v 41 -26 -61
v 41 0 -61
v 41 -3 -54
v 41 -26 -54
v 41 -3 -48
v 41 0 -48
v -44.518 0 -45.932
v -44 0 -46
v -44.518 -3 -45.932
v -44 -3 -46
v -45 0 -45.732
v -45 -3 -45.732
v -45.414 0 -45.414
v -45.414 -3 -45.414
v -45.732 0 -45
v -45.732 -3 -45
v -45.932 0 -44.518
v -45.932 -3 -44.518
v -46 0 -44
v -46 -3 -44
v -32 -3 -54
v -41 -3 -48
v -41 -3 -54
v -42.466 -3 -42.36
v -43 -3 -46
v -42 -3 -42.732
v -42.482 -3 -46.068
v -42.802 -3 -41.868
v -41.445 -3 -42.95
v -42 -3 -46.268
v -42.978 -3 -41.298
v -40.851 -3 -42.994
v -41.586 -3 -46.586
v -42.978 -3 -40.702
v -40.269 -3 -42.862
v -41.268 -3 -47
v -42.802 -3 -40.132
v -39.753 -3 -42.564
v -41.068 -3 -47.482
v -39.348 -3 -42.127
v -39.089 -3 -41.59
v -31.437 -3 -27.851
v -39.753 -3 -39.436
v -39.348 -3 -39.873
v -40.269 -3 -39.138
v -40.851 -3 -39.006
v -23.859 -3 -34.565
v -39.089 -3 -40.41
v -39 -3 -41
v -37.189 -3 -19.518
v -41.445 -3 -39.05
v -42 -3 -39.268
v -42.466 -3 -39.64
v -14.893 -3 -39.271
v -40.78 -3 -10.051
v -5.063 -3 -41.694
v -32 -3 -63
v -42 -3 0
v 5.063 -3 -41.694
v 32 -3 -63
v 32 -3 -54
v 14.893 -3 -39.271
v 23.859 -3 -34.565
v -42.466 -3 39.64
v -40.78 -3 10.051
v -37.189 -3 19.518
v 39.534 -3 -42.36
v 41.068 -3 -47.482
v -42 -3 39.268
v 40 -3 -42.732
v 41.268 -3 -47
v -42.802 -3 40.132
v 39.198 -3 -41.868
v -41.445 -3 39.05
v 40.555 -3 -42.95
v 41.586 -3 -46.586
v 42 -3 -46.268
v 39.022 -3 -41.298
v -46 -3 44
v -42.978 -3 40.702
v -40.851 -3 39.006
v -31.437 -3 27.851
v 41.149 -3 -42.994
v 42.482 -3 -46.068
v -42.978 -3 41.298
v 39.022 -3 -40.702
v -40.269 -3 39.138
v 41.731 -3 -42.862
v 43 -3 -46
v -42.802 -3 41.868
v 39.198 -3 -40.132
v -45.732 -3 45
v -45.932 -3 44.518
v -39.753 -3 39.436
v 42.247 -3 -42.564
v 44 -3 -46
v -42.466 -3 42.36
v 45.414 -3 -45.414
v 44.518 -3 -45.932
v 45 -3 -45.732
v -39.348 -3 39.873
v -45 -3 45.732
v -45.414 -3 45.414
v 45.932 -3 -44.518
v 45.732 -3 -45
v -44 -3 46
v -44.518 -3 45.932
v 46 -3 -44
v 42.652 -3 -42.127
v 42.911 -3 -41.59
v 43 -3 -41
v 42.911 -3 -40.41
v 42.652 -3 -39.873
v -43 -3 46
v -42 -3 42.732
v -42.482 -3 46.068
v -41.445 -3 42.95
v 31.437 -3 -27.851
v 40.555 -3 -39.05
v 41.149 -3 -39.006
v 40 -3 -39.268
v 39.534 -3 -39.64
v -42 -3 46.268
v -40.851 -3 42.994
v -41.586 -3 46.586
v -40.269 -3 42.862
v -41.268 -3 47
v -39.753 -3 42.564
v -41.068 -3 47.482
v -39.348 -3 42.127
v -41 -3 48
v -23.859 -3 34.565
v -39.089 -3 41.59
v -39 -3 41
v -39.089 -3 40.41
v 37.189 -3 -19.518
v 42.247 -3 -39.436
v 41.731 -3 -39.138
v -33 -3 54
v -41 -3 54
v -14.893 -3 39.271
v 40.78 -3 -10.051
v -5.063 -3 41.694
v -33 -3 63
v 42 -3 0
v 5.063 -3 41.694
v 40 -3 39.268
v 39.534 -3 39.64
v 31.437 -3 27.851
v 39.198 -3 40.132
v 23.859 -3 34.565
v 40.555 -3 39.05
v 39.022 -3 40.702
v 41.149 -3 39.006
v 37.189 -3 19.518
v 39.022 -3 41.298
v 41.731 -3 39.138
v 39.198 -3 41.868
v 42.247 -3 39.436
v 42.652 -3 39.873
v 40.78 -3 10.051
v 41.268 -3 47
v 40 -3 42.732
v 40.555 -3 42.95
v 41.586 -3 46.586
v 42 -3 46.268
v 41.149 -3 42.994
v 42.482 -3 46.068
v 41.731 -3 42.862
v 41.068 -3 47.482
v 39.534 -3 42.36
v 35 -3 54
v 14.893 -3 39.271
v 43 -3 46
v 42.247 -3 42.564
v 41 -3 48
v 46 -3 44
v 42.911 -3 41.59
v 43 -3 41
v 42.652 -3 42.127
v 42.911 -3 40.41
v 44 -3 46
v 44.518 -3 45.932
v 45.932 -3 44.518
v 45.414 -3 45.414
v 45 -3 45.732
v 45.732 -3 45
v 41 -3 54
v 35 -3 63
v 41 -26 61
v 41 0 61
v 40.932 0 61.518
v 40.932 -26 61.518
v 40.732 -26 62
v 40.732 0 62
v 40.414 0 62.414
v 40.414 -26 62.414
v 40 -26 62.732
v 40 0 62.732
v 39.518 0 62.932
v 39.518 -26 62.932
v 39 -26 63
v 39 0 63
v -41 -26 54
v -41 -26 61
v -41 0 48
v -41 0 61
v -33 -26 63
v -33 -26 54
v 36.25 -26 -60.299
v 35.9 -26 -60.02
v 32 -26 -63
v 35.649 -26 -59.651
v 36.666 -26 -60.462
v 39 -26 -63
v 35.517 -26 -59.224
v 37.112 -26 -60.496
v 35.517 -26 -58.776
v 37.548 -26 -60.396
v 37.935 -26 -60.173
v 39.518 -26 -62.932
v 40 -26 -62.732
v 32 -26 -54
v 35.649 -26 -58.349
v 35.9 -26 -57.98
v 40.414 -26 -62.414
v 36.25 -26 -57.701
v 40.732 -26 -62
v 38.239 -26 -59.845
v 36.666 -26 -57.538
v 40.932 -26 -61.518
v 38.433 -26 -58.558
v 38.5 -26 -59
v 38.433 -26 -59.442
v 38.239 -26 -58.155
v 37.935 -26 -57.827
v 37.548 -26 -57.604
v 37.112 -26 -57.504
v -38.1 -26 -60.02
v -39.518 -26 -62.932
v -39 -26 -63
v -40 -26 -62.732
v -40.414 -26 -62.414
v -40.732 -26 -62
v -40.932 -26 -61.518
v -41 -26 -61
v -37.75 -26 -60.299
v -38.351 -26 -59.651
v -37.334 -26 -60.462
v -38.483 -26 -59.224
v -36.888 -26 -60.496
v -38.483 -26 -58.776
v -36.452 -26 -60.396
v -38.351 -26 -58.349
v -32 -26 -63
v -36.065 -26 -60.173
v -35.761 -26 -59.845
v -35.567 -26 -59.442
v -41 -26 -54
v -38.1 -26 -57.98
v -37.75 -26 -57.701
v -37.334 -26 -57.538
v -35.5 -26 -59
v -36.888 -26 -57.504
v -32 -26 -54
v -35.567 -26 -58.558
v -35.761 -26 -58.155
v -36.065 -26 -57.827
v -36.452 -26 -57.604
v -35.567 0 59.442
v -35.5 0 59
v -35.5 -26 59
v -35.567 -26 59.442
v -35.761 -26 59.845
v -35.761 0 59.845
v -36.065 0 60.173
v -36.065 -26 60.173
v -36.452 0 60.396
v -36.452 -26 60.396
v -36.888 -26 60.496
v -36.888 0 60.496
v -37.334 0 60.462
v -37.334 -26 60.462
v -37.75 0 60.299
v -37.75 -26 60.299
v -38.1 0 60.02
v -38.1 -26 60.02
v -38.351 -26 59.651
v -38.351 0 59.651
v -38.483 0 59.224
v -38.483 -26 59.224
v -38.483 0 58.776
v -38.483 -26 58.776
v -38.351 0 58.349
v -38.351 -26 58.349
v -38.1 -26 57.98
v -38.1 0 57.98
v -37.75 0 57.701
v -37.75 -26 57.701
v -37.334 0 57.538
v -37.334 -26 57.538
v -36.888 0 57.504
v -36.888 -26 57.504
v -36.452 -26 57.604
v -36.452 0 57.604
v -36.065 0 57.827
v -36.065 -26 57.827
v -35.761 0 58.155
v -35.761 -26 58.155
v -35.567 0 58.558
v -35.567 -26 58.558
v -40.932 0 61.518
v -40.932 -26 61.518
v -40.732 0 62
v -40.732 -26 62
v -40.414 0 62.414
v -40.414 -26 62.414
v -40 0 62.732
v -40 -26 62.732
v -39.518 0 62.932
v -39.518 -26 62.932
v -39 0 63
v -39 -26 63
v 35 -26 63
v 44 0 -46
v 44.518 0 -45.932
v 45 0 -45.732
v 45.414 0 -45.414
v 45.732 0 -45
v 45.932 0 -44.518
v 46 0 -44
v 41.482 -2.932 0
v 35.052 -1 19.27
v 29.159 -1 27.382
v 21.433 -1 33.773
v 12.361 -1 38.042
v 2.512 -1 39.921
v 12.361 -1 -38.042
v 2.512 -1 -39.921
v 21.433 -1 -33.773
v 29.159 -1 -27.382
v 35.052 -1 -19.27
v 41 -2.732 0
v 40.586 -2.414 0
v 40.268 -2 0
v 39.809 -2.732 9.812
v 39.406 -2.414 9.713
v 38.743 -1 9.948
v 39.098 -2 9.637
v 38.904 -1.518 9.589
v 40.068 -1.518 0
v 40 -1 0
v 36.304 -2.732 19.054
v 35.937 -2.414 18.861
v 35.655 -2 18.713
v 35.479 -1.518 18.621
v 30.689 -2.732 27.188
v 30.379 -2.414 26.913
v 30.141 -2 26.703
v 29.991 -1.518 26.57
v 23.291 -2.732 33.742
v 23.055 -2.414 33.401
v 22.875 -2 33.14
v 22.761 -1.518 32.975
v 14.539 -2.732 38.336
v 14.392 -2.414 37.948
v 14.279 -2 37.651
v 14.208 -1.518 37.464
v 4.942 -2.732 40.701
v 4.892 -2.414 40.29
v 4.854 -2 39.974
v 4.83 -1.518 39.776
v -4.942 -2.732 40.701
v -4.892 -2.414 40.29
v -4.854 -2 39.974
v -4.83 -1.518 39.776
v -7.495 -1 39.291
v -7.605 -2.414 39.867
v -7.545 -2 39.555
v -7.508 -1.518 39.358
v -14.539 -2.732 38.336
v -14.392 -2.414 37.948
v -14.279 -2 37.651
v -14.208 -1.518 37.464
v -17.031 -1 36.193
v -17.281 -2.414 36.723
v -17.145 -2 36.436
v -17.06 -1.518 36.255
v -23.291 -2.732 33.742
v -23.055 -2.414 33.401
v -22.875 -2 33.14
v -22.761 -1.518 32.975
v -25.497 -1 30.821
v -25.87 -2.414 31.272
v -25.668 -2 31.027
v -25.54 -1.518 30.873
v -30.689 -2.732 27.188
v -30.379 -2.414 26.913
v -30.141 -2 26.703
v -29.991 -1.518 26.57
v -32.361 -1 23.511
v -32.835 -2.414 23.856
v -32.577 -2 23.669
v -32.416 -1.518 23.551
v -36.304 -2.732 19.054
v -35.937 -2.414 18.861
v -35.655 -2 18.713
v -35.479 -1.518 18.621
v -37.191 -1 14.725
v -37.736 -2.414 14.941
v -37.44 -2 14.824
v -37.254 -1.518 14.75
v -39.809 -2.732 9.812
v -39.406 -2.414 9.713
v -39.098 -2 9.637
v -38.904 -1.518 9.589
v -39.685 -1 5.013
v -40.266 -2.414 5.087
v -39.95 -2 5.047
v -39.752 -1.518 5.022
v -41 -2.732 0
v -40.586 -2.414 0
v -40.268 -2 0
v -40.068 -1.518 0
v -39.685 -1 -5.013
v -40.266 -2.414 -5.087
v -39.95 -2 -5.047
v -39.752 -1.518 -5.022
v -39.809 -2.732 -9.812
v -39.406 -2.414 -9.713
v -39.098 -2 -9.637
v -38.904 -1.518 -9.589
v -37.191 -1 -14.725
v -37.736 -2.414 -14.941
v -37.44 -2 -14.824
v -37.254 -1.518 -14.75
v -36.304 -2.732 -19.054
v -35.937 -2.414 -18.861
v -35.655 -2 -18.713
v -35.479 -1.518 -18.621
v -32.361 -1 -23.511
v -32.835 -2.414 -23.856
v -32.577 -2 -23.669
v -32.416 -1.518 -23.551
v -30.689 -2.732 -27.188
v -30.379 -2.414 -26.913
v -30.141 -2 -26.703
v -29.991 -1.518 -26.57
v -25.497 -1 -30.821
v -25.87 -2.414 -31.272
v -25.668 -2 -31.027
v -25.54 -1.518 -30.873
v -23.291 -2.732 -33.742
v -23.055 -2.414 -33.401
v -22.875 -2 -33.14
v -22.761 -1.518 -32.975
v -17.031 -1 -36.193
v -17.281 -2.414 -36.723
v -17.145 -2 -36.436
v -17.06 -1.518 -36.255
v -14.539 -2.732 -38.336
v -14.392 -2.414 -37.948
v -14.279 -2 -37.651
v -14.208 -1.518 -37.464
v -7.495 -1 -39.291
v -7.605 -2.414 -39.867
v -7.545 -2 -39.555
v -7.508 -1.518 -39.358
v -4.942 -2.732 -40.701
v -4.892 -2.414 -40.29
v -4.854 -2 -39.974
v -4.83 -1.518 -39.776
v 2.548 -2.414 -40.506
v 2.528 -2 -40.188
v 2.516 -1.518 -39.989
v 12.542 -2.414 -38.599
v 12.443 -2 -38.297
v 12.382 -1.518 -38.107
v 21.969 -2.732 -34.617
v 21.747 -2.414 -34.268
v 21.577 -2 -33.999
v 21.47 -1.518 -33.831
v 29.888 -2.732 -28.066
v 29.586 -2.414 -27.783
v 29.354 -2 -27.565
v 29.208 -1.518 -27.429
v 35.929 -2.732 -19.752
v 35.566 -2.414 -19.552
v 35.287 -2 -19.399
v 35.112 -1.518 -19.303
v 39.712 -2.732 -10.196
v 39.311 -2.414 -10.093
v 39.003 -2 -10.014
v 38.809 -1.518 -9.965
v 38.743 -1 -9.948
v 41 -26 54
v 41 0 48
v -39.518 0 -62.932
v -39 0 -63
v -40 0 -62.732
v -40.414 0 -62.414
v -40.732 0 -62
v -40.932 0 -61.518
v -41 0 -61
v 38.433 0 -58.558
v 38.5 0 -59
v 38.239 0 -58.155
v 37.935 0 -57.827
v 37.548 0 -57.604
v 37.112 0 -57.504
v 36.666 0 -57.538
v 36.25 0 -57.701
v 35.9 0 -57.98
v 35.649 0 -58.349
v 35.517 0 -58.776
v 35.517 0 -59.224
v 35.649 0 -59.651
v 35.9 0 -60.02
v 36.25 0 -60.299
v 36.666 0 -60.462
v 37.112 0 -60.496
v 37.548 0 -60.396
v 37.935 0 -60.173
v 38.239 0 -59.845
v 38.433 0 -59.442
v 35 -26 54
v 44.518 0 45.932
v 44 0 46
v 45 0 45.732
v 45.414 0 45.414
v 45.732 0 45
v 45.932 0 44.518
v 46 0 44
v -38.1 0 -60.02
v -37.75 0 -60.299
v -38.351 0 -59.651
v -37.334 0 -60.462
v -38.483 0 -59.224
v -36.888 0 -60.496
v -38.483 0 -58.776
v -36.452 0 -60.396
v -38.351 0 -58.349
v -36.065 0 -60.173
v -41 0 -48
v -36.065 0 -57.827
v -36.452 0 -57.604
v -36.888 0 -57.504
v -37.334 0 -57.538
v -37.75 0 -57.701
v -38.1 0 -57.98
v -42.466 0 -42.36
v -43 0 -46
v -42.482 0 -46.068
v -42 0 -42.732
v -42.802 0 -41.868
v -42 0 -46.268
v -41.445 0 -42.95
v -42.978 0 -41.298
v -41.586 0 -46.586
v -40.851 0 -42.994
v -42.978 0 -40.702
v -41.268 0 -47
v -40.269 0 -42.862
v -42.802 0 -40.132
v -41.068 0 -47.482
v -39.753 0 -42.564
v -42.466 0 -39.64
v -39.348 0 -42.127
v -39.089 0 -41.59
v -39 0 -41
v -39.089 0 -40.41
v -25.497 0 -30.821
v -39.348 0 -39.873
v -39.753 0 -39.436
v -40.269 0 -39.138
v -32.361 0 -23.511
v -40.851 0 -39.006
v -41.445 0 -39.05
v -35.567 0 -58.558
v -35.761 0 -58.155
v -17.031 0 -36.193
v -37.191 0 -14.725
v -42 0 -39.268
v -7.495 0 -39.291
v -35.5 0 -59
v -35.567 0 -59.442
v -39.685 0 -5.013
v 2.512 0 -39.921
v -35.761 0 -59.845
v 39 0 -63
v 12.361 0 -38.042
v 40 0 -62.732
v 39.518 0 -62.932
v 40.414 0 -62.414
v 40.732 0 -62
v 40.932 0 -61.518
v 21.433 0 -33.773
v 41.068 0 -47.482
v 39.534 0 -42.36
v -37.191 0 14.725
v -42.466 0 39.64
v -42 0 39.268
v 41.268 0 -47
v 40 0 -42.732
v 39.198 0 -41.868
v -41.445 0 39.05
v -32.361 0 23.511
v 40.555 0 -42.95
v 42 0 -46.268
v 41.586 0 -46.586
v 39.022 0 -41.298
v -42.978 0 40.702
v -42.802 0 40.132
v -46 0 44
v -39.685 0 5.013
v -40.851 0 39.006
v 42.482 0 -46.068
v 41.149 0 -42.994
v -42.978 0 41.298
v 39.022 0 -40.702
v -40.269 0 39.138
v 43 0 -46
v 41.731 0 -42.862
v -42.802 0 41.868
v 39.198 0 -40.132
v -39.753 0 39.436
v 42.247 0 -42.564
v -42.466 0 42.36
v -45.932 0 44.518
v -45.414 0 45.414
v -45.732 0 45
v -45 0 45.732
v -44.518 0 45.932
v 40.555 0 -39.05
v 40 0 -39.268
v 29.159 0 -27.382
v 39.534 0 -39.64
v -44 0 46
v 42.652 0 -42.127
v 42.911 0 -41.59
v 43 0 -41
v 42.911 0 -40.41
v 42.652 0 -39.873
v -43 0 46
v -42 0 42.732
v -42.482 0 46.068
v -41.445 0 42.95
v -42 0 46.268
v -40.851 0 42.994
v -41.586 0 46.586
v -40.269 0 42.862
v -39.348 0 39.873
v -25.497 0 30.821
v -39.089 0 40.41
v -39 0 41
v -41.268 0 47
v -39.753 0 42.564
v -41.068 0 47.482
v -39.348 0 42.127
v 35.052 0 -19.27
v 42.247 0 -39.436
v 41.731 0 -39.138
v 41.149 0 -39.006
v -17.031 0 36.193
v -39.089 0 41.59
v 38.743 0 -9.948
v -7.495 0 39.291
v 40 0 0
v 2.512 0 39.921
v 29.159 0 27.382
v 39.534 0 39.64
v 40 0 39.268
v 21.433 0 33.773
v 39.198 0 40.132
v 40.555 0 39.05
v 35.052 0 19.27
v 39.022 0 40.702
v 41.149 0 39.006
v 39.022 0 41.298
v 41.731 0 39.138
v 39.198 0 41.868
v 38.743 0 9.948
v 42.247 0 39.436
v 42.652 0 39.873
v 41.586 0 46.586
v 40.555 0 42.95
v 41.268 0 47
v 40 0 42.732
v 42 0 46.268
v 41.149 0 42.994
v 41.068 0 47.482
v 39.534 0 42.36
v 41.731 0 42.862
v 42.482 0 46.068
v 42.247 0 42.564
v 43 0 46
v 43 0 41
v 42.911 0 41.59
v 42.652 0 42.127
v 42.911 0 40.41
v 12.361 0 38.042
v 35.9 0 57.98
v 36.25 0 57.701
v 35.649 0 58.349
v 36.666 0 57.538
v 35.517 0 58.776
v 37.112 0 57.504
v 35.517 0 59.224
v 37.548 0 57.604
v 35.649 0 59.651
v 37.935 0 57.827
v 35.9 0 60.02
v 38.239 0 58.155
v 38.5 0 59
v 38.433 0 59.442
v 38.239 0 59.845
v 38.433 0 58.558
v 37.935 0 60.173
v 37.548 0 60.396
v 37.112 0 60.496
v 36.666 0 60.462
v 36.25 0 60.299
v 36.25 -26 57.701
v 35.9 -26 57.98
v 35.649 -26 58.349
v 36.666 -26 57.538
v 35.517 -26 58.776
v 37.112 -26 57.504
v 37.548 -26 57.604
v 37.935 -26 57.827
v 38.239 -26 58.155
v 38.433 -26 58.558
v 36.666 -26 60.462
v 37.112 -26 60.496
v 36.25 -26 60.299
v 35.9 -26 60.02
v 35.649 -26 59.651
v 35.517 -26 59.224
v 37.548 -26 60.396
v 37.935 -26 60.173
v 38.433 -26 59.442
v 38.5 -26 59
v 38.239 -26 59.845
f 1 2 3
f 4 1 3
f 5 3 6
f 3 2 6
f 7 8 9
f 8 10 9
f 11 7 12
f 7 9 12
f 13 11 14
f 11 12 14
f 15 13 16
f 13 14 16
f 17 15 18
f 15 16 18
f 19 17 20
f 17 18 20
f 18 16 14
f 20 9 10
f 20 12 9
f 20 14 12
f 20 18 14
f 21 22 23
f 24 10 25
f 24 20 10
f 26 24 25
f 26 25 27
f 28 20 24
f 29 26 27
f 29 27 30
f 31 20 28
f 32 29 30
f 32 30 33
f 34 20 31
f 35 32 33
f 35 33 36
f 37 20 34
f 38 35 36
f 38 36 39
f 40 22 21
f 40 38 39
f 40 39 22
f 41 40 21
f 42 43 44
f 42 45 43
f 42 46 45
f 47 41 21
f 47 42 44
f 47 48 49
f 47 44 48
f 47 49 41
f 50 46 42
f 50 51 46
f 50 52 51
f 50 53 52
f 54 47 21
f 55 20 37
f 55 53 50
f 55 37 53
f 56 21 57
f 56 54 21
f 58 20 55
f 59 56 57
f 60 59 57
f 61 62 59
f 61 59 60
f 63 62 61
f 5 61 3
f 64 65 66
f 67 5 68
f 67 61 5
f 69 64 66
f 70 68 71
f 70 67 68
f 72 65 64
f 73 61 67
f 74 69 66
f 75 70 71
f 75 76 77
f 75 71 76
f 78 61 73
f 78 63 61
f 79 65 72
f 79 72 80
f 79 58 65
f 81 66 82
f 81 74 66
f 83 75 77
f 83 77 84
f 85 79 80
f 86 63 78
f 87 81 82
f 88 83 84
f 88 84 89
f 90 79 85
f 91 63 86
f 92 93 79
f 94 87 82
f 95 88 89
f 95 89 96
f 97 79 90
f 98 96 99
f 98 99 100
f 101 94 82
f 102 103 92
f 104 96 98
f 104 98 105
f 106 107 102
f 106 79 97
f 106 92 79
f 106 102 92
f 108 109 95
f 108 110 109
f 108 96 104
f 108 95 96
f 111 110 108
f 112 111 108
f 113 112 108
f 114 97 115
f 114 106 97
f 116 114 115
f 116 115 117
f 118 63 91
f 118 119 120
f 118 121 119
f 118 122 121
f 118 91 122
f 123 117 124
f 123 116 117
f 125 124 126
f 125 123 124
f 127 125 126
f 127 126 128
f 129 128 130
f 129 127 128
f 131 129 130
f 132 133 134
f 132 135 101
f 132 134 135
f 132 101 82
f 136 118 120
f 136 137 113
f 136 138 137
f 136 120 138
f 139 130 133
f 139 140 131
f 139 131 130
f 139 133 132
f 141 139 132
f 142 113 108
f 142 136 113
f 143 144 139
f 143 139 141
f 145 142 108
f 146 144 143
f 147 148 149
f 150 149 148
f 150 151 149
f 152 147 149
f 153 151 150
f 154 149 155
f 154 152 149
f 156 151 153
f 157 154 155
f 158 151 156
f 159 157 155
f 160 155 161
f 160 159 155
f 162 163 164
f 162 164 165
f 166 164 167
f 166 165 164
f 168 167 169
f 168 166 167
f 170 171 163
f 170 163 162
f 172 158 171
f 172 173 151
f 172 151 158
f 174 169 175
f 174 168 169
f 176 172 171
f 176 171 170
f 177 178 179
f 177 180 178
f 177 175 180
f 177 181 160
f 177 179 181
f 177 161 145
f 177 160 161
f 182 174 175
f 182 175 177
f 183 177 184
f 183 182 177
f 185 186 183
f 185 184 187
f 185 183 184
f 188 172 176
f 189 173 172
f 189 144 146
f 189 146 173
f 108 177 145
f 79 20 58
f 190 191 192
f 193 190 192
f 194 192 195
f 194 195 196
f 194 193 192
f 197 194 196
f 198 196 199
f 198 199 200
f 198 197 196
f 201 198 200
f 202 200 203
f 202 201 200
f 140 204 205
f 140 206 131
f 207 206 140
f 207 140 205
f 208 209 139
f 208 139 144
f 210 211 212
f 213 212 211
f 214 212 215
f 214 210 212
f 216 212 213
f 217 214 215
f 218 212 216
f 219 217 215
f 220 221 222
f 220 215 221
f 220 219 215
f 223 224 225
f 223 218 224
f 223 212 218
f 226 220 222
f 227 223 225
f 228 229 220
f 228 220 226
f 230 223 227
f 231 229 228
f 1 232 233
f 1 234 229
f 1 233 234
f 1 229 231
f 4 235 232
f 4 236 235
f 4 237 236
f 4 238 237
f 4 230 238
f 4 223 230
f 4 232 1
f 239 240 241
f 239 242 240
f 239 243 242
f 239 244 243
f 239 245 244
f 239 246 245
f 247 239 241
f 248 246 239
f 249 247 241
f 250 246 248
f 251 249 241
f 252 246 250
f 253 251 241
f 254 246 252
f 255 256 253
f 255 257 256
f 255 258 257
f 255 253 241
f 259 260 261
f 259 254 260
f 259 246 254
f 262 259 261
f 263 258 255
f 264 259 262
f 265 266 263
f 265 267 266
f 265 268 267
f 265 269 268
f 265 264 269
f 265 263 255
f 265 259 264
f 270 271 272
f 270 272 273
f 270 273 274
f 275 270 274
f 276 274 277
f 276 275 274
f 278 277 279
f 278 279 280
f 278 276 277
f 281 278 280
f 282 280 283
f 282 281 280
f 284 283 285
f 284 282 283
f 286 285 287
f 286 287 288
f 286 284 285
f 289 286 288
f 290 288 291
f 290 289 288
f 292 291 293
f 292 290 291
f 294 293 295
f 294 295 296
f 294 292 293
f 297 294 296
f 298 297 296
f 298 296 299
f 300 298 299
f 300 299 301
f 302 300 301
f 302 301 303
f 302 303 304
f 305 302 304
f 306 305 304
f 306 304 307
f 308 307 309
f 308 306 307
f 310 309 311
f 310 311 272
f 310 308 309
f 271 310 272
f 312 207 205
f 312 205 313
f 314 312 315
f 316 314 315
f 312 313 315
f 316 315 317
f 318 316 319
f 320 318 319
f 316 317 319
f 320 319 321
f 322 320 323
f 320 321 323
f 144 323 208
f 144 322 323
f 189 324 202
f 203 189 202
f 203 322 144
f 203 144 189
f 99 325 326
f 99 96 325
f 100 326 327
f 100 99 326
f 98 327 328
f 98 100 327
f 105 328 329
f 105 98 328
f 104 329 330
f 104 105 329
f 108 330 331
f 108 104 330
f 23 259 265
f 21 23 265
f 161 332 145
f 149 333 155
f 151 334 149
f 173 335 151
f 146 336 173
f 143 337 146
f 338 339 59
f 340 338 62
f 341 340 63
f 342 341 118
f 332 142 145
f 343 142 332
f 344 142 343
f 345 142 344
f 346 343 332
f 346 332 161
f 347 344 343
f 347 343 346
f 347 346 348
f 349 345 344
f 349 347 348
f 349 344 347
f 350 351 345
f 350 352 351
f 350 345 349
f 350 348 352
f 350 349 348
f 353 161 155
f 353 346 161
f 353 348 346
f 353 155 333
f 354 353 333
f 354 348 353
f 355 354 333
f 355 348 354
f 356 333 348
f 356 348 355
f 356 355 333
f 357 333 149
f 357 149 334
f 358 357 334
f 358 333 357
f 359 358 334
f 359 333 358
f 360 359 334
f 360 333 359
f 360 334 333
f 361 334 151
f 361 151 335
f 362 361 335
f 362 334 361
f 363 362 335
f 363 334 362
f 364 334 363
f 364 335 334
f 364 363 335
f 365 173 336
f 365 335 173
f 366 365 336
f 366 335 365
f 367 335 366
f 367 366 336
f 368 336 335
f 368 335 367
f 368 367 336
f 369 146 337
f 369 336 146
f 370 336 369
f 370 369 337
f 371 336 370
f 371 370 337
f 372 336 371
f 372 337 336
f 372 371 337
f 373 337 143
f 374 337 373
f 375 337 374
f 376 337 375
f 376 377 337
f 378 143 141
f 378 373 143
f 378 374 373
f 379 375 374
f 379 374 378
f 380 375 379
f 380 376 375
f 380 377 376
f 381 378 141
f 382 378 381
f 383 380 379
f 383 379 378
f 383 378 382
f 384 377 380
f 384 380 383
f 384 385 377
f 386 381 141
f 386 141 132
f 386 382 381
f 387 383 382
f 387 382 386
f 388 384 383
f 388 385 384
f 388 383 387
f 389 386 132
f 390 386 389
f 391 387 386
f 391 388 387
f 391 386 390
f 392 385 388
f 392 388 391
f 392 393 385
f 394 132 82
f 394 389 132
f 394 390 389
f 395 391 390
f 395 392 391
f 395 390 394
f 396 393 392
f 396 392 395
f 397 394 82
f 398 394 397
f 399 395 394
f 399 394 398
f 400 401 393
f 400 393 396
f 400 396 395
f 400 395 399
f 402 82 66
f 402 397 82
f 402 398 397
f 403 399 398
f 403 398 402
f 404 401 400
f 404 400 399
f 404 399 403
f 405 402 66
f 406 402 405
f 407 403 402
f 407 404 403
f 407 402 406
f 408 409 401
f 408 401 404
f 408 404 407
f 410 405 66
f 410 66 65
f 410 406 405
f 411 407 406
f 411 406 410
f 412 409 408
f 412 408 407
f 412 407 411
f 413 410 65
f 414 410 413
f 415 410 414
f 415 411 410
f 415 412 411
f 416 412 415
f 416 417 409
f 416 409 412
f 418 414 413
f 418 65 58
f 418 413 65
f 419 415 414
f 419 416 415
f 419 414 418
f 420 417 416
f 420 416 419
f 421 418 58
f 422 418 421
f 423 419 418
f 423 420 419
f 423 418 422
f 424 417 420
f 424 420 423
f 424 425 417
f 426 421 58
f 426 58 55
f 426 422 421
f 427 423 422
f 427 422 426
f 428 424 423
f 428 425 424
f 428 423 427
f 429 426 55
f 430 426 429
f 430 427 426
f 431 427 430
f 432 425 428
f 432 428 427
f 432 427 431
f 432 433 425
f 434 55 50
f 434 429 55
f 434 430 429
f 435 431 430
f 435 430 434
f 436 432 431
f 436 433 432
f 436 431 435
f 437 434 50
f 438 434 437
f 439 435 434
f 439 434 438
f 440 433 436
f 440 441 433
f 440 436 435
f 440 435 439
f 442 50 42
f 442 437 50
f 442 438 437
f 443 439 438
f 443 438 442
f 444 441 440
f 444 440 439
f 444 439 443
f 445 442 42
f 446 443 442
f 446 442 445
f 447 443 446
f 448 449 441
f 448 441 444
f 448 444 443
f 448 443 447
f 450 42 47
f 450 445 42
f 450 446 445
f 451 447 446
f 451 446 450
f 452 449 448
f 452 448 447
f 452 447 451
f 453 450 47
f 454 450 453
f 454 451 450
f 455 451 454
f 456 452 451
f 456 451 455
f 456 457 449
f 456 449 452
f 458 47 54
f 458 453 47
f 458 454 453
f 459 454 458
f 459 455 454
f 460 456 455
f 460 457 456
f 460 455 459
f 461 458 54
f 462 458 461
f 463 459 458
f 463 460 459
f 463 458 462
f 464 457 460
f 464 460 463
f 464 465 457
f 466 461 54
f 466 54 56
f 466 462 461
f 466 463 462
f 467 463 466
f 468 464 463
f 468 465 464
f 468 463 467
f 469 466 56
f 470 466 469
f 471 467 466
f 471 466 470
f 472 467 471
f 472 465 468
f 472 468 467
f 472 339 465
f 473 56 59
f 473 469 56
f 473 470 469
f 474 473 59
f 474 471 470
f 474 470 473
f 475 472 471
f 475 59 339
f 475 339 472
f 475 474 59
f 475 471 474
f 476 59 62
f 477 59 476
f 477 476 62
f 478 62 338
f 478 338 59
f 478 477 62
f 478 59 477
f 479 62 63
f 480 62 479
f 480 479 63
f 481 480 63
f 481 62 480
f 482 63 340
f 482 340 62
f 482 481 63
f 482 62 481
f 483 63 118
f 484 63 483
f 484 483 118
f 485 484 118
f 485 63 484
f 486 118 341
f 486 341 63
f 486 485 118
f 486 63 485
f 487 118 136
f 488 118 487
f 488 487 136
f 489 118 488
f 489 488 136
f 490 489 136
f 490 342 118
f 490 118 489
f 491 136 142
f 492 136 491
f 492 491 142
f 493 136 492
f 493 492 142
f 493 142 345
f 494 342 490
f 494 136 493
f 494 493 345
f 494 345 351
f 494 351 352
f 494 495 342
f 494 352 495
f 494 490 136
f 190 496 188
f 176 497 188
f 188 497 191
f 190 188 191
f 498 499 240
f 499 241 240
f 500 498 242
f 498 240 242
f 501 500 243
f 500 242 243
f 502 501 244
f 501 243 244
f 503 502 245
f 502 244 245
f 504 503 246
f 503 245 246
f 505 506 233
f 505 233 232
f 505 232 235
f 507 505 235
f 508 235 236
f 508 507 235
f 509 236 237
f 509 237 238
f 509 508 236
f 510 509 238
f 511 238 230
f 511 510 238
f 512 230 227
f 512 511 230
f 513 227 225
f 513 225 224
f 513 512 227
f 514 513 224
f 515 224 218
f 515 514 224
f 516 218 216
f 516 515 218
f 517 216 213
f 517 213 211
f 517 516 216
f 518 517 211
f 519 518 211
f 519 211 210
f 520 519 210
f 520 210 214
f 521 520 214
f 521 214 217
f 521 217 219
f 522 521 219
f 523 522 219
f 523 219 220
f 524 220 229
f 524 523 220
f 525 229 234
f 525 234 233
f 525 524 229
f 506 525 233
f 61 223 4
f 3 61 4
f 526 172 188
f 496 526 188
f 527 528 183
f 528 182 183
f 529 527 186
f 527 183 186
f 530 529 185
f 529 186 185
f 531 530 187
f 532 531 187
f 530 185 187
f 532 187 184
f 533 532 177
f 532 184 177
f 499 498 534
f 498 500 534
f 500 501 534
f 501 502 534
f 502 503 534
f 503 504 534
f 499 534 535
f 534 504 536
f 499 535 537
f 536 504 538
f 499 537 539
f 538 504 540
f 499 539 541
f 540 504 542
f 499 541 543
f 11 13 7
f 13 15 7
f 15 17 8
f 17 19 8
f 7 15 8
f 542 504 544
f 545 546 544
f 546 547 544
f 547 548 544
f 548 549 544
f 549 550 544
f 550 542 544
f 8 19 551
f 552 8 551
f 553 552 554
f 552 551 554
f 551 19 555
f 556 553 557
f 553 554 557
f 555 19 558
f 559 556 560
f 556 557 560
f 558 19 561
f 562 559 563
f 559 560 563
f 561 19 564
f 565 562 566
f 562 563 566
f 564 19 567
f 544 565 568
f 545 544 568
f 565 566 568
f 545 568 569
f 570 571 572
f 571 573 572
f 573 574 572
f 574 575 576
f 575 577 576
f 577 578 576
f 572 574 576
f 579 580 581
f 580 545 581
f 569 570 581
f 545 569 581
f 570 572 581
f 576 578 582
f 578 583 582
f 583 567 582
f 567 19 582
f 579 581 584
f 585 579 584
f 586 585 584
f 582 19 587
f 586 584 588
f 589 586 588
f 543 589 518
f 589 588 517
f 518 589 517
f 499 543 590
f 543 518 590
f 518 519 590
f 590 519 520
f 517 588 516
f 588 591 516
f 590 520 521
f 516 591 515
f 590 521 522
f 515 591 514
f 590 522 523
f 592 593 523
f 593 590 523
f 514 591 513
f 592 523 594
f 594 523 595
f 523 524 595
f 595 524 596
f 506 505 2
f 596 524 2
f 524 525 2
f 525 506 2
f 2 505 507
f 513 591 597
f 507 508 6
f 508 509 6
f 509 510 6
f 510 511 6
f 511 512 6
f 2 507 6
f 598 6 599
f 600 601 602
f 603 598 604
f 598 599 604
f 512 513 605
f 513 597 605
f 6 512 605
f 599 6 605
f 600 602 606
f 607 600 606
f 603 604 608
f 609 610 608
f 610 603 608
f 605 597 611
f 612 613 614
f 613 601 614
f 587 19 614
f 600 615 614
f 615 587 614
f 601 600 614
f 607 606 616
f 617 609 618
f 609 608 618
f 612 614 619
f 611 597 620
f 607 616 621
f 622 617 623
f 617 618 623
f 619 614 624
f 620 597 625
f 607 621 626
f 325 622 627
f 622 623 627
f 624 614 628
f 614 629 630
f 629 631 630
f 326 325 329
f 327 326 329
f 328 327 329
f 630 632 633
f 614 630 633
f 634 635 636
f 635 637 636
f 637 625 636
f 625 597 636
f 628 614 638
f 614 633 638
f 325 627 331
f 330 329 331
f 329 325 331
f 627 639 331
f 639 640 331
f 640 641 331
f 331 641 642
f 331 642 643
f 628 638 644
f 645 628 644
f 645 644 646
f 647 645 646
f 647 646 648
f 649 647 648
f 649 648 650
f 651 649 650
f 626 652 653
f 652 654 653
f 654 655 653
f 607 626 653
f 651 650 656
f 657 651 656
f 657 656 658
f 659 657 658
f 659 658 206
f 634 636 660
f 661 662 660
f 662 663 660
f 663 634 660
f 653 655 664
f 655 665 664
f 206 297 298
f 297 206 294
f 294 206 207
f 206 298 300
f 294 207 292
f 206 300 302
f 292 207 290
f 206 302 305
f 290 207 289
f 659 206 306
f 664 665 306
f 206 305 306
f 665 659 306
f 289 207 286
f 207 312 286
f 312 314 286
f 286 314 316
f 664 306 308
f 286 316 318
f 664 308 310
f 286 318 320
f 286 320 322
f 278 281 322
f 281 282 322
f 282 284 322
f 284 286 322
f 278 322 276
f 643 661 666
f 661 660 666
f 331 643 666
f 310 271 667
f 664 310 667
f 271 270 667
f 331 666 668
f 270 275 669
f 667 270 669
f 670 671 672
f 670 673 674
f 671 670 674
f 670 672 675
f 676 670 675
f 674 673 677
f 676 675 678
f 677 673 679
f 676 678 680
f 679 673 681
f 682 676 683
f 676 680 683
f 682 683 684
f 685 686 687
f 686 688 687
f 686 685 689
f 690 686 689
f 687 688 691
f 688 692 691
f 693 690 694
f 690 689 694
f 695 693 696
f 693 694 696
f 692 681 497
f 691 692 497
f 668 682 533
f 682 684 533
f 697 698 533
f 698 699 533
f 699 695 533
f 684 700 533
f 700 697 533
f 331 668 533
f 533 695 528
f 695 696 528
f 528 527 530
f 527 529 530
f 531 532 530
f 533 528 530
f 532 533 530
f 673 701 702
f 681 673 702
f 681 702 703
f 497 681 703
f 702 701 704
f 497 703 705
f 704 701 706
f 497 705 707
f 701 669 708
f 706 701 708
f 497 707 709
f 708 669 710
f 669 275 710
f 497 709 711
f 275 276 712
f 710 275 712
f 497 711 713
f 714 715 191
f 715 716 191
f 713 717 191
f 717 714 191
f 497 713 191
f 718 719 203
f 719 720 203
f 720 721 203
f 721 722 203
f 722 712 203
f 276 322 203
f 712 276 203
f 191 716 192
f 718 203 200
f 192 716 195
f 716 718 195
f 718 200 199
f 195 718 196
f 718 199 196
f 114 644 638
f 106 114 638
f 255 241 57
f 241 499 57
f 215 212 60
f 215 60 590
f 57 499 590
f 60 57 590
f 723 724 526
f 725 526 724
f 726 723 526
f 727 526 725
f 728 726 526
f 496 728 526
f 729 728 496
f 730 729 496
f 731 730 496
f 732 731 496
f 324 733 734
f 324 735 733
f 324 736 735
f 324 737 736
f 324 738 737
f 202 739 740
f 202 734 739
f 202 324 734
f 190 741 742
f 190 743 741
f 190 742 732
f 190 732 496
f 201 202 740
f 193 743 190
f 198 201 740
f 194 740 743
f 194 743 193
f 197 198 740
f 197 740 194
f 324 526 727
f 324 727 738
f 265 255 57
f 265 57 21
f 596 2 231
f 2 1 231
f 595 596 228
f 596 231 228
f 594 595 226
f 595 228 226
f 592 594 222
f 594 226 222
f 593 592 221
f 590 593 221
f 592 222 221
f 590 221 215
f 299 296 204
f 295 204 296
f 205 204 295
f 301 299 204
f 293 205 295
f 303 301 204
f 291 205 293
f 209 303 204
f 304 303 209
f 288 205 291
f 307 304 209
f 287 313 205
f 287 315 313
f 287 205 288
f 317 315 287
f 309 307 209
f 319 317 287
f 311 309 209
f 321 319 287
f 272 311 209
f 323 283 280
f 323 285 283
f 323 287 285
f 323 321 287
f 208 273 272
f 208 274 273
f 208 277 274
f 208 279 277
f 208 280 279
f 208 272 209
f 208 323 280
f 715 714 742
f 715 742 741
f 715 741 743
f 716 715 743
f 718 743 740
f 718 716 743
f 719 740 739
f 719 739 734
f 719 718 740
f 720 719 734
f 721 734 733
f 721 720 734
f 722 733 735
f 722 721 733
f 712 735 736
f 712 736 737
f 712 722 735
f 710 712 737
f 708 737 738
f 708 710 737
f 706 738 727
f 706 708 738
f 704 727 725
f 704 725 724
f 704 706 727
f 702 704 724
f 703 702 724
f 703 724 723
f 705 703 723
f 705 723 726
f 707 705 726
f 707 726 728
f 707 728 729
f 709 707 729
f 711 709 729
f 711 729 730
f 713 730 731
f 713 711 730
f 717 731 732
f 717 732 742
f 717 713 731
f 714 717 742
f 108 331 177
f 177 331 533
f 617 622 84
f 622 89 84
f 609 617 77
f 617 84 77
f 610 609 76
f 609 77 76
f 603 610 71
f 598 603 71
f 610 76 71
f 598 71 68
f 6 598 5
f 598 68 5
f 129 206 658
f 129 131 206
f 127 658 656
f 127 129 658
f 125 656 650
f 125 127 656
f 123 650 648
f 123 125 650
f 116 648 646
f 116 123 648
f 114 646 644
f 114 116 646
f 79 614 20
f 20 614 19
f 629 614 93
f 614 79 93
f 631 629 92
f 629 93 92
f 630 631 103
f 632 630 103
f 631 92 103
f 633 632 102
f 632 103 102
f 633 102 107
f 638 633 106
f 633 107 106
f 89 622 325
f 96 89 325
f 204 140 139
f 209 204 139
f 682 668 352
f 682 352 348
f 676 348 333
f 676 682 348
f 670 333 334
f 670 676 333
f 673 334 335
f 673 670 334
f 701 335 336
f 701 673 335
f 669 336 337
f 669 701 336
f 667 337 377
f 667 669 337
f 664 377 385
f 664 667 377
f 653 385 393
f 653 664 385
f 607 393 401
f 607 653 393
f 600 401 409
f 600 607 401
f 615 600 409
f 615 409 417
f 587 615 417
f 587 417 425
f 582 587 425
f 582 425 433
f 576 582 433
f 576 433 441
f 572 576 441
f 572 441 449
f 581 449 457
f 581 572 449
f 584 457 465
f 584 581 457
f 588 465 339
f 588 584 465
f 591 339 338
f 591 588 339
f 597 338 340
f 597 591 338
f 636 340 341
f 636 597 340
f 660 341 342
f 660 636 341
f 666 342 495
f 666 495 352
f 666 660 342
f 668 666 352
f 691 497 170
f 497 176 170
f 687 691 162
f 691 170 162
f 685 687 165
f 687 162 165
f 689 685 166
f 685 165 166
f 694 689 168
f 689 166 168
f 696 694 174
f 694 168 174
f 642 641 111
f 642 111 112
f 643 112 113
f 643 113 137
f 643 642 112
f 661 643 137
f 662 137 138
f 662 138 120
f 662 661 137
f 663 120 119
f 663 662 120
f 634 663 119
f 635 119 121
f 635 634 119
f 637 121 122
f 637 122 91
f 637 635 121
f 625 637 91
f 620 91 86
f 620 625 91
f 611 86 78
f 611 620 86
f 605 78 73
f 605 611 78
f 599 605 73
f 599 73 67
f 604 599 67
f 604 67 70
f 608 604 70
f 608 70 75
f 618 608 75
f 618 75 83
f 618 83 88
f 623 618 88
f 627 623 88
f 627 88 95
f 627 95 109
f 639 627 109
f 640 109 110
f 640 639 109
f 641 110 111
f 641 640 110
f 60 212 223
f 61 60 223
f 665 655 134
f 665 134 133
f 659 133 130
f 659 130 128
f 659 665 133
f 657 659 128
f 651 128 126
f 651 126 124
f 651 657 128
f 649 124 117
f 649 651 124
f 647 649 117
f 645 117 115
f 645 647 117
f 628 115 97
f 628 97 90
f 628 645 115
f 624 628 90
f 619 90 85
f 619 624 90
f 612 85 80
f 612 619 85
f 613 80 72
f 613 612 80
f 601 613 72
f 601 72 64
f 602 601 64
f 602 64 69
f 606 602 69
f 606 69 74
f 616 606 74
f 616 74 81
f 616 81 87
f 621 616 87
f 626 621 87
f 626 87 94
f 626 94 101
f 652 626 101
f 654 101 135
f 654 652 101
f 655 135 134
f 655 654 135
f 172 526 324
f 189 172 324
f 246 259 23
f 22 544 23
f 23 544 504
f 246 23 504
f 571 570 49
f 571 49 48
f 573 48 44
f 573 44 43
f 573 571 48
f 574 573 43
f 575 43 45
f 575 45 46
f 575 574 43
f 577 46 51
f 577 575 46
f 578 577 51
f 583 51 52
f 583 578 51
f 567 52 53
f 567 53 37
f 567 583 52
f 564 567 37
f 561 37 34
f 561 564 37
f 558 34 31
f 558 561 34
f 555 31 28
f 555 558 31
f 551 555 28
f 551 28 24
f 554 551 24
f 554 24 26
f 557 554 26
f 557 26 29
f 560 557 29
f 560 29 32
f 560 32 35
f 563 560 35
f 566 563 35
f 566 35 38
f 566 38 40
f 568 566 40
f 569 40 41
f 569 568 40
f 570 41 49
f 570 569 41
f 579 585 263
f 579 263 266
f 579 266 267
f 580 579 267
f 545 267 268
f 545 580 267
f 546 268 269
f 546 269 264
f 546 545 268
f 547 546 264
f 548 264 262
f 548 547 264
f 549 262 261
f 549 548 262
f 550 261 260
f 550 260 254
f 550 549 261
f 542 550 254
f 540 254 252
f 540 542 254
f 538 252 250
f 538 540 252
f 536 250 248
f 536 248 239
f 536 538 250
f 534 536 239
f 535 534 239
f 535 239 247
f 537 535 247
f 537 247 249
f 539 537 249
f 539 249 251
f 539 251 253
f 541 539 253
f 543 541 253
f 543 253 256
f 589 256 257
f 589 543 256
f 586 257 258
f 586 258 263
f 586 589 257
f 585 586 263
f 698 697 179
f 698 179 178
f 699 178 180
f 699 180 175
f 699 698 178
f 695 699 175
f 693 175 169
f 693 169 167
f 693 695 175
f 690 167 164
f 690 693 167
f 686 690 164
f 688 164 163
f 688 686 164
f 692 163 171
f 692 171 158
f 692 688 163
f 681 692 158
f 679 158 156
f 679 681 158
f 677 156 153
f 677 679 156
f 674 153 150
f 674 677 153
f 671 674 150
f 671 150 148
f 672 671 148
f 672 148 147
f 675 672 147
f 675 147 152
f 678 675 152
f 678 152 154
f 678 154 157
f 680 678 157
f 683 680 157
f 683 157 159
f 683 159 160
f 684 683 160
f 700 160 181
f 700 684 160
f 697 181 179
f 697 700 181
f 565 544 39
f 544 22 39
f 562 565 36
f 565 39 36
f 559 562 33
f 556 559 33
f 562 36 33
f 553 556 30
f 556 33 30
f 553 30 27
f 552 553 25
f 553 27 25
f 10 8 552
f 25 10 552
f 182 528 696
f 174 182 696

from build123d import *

# Parameters (mm, degrees)
F0_R     = 2
F0_R_2   = 40
F1_DEPTH = 3
F0_W     = 8
F0_H     = 9
F0_R_3   = 1.5
F0_W_2   = 6
F0_W_3   = 9
F2_DEPTH = 26
F3_R     = 2


with BuildPart() as f1:
    # F0 (on Front) → F1 (new body)
    with BuildSketch(Plane.XZ):
        Polygon((41, -46), (46, -46), (46, 46), (41, 46), (-41, 46), (-46, 46), (-46, -46), (-41, -46), align=None)
        with Locations((-41, -41)):
            Circle(F0_R, mode=Mode.SUBTRACT)
        with Locations((41, -41)):
            Circle(F0_R, mode=Mode.SUBTRACT)
        with Locations((-41, 41)):
            Circle(F0_R, mode=Mode.SUBTRACT)
        Circle(F0_R_2, mode=Mode.SUBTRACT)
        with Locations((41, 41)):
            Circle(F0_R, mode=Mode.SUBTRACT)
        Polygon((41, -54), (41, -46), (-41, -46), (-41, -54), (-32, -54), (-32, -63), (32, -63), (32, -54), align=None)
        Polygon((-41, 46), (41, 46), (41, 54), (35, 54), (35, 63), (-33, 63), (-33, 54), (-41, 54), align=None)
    extrude(amount=F1_DEPTH)

    # F0 (on Front) → F2 (join)
    with BuildSketch(Plane.XZ):
        with Locations((-37, 58.5)):
            Rectangle(F0_W, F0_H)
        with Locations((-37, 59)):
            Circle(F0_R_3, mode=Mode.SUBTRACT)
        with Locations((38, 58.5)):
            Rectangle(F0_W_2, F0_H)
        with Locations((37, 59)):
            Circle(F0_R_3, mode=Mode.SUBTRACT)
        with Locations((36.5, -58.5)):
            Rectangle(F0_W_3, F0_H)
        with Locations((37, -59)):
            Circle(F0_R_3, mode=Mode.SUBTRACT)
        with Locations((-36.5, -58.5)):
            Rectangle(F0_W_3, F0_H)
        with Locations((-37, -59)):
            Circle(F0_R_3, mode=Mode.SUBTRACT)
    extrude(amount=F2_DEPTH)

    # F3
    f3_edges = [f1.edges().sort_by_distance(p)[0] for p in [
        (-40, -3, 0),
        (-46, -1.5, -46),
        (-46, -1.5, 46),
        (46, -1.5, -46),
        (41, -1.5, -46),
        (-41, -1.5, -46),
        (-41, -13, -63),
        (41, -13, -63),
        (46, -1.5, 46),
        (41, -1.5, 46),
        (41, -13, 63),
        (-41, -13, 63),
        (-41, -1.5, 46),
    ]]
    fillet(f3_edges, radius=F3_R)


solid = f1.part
